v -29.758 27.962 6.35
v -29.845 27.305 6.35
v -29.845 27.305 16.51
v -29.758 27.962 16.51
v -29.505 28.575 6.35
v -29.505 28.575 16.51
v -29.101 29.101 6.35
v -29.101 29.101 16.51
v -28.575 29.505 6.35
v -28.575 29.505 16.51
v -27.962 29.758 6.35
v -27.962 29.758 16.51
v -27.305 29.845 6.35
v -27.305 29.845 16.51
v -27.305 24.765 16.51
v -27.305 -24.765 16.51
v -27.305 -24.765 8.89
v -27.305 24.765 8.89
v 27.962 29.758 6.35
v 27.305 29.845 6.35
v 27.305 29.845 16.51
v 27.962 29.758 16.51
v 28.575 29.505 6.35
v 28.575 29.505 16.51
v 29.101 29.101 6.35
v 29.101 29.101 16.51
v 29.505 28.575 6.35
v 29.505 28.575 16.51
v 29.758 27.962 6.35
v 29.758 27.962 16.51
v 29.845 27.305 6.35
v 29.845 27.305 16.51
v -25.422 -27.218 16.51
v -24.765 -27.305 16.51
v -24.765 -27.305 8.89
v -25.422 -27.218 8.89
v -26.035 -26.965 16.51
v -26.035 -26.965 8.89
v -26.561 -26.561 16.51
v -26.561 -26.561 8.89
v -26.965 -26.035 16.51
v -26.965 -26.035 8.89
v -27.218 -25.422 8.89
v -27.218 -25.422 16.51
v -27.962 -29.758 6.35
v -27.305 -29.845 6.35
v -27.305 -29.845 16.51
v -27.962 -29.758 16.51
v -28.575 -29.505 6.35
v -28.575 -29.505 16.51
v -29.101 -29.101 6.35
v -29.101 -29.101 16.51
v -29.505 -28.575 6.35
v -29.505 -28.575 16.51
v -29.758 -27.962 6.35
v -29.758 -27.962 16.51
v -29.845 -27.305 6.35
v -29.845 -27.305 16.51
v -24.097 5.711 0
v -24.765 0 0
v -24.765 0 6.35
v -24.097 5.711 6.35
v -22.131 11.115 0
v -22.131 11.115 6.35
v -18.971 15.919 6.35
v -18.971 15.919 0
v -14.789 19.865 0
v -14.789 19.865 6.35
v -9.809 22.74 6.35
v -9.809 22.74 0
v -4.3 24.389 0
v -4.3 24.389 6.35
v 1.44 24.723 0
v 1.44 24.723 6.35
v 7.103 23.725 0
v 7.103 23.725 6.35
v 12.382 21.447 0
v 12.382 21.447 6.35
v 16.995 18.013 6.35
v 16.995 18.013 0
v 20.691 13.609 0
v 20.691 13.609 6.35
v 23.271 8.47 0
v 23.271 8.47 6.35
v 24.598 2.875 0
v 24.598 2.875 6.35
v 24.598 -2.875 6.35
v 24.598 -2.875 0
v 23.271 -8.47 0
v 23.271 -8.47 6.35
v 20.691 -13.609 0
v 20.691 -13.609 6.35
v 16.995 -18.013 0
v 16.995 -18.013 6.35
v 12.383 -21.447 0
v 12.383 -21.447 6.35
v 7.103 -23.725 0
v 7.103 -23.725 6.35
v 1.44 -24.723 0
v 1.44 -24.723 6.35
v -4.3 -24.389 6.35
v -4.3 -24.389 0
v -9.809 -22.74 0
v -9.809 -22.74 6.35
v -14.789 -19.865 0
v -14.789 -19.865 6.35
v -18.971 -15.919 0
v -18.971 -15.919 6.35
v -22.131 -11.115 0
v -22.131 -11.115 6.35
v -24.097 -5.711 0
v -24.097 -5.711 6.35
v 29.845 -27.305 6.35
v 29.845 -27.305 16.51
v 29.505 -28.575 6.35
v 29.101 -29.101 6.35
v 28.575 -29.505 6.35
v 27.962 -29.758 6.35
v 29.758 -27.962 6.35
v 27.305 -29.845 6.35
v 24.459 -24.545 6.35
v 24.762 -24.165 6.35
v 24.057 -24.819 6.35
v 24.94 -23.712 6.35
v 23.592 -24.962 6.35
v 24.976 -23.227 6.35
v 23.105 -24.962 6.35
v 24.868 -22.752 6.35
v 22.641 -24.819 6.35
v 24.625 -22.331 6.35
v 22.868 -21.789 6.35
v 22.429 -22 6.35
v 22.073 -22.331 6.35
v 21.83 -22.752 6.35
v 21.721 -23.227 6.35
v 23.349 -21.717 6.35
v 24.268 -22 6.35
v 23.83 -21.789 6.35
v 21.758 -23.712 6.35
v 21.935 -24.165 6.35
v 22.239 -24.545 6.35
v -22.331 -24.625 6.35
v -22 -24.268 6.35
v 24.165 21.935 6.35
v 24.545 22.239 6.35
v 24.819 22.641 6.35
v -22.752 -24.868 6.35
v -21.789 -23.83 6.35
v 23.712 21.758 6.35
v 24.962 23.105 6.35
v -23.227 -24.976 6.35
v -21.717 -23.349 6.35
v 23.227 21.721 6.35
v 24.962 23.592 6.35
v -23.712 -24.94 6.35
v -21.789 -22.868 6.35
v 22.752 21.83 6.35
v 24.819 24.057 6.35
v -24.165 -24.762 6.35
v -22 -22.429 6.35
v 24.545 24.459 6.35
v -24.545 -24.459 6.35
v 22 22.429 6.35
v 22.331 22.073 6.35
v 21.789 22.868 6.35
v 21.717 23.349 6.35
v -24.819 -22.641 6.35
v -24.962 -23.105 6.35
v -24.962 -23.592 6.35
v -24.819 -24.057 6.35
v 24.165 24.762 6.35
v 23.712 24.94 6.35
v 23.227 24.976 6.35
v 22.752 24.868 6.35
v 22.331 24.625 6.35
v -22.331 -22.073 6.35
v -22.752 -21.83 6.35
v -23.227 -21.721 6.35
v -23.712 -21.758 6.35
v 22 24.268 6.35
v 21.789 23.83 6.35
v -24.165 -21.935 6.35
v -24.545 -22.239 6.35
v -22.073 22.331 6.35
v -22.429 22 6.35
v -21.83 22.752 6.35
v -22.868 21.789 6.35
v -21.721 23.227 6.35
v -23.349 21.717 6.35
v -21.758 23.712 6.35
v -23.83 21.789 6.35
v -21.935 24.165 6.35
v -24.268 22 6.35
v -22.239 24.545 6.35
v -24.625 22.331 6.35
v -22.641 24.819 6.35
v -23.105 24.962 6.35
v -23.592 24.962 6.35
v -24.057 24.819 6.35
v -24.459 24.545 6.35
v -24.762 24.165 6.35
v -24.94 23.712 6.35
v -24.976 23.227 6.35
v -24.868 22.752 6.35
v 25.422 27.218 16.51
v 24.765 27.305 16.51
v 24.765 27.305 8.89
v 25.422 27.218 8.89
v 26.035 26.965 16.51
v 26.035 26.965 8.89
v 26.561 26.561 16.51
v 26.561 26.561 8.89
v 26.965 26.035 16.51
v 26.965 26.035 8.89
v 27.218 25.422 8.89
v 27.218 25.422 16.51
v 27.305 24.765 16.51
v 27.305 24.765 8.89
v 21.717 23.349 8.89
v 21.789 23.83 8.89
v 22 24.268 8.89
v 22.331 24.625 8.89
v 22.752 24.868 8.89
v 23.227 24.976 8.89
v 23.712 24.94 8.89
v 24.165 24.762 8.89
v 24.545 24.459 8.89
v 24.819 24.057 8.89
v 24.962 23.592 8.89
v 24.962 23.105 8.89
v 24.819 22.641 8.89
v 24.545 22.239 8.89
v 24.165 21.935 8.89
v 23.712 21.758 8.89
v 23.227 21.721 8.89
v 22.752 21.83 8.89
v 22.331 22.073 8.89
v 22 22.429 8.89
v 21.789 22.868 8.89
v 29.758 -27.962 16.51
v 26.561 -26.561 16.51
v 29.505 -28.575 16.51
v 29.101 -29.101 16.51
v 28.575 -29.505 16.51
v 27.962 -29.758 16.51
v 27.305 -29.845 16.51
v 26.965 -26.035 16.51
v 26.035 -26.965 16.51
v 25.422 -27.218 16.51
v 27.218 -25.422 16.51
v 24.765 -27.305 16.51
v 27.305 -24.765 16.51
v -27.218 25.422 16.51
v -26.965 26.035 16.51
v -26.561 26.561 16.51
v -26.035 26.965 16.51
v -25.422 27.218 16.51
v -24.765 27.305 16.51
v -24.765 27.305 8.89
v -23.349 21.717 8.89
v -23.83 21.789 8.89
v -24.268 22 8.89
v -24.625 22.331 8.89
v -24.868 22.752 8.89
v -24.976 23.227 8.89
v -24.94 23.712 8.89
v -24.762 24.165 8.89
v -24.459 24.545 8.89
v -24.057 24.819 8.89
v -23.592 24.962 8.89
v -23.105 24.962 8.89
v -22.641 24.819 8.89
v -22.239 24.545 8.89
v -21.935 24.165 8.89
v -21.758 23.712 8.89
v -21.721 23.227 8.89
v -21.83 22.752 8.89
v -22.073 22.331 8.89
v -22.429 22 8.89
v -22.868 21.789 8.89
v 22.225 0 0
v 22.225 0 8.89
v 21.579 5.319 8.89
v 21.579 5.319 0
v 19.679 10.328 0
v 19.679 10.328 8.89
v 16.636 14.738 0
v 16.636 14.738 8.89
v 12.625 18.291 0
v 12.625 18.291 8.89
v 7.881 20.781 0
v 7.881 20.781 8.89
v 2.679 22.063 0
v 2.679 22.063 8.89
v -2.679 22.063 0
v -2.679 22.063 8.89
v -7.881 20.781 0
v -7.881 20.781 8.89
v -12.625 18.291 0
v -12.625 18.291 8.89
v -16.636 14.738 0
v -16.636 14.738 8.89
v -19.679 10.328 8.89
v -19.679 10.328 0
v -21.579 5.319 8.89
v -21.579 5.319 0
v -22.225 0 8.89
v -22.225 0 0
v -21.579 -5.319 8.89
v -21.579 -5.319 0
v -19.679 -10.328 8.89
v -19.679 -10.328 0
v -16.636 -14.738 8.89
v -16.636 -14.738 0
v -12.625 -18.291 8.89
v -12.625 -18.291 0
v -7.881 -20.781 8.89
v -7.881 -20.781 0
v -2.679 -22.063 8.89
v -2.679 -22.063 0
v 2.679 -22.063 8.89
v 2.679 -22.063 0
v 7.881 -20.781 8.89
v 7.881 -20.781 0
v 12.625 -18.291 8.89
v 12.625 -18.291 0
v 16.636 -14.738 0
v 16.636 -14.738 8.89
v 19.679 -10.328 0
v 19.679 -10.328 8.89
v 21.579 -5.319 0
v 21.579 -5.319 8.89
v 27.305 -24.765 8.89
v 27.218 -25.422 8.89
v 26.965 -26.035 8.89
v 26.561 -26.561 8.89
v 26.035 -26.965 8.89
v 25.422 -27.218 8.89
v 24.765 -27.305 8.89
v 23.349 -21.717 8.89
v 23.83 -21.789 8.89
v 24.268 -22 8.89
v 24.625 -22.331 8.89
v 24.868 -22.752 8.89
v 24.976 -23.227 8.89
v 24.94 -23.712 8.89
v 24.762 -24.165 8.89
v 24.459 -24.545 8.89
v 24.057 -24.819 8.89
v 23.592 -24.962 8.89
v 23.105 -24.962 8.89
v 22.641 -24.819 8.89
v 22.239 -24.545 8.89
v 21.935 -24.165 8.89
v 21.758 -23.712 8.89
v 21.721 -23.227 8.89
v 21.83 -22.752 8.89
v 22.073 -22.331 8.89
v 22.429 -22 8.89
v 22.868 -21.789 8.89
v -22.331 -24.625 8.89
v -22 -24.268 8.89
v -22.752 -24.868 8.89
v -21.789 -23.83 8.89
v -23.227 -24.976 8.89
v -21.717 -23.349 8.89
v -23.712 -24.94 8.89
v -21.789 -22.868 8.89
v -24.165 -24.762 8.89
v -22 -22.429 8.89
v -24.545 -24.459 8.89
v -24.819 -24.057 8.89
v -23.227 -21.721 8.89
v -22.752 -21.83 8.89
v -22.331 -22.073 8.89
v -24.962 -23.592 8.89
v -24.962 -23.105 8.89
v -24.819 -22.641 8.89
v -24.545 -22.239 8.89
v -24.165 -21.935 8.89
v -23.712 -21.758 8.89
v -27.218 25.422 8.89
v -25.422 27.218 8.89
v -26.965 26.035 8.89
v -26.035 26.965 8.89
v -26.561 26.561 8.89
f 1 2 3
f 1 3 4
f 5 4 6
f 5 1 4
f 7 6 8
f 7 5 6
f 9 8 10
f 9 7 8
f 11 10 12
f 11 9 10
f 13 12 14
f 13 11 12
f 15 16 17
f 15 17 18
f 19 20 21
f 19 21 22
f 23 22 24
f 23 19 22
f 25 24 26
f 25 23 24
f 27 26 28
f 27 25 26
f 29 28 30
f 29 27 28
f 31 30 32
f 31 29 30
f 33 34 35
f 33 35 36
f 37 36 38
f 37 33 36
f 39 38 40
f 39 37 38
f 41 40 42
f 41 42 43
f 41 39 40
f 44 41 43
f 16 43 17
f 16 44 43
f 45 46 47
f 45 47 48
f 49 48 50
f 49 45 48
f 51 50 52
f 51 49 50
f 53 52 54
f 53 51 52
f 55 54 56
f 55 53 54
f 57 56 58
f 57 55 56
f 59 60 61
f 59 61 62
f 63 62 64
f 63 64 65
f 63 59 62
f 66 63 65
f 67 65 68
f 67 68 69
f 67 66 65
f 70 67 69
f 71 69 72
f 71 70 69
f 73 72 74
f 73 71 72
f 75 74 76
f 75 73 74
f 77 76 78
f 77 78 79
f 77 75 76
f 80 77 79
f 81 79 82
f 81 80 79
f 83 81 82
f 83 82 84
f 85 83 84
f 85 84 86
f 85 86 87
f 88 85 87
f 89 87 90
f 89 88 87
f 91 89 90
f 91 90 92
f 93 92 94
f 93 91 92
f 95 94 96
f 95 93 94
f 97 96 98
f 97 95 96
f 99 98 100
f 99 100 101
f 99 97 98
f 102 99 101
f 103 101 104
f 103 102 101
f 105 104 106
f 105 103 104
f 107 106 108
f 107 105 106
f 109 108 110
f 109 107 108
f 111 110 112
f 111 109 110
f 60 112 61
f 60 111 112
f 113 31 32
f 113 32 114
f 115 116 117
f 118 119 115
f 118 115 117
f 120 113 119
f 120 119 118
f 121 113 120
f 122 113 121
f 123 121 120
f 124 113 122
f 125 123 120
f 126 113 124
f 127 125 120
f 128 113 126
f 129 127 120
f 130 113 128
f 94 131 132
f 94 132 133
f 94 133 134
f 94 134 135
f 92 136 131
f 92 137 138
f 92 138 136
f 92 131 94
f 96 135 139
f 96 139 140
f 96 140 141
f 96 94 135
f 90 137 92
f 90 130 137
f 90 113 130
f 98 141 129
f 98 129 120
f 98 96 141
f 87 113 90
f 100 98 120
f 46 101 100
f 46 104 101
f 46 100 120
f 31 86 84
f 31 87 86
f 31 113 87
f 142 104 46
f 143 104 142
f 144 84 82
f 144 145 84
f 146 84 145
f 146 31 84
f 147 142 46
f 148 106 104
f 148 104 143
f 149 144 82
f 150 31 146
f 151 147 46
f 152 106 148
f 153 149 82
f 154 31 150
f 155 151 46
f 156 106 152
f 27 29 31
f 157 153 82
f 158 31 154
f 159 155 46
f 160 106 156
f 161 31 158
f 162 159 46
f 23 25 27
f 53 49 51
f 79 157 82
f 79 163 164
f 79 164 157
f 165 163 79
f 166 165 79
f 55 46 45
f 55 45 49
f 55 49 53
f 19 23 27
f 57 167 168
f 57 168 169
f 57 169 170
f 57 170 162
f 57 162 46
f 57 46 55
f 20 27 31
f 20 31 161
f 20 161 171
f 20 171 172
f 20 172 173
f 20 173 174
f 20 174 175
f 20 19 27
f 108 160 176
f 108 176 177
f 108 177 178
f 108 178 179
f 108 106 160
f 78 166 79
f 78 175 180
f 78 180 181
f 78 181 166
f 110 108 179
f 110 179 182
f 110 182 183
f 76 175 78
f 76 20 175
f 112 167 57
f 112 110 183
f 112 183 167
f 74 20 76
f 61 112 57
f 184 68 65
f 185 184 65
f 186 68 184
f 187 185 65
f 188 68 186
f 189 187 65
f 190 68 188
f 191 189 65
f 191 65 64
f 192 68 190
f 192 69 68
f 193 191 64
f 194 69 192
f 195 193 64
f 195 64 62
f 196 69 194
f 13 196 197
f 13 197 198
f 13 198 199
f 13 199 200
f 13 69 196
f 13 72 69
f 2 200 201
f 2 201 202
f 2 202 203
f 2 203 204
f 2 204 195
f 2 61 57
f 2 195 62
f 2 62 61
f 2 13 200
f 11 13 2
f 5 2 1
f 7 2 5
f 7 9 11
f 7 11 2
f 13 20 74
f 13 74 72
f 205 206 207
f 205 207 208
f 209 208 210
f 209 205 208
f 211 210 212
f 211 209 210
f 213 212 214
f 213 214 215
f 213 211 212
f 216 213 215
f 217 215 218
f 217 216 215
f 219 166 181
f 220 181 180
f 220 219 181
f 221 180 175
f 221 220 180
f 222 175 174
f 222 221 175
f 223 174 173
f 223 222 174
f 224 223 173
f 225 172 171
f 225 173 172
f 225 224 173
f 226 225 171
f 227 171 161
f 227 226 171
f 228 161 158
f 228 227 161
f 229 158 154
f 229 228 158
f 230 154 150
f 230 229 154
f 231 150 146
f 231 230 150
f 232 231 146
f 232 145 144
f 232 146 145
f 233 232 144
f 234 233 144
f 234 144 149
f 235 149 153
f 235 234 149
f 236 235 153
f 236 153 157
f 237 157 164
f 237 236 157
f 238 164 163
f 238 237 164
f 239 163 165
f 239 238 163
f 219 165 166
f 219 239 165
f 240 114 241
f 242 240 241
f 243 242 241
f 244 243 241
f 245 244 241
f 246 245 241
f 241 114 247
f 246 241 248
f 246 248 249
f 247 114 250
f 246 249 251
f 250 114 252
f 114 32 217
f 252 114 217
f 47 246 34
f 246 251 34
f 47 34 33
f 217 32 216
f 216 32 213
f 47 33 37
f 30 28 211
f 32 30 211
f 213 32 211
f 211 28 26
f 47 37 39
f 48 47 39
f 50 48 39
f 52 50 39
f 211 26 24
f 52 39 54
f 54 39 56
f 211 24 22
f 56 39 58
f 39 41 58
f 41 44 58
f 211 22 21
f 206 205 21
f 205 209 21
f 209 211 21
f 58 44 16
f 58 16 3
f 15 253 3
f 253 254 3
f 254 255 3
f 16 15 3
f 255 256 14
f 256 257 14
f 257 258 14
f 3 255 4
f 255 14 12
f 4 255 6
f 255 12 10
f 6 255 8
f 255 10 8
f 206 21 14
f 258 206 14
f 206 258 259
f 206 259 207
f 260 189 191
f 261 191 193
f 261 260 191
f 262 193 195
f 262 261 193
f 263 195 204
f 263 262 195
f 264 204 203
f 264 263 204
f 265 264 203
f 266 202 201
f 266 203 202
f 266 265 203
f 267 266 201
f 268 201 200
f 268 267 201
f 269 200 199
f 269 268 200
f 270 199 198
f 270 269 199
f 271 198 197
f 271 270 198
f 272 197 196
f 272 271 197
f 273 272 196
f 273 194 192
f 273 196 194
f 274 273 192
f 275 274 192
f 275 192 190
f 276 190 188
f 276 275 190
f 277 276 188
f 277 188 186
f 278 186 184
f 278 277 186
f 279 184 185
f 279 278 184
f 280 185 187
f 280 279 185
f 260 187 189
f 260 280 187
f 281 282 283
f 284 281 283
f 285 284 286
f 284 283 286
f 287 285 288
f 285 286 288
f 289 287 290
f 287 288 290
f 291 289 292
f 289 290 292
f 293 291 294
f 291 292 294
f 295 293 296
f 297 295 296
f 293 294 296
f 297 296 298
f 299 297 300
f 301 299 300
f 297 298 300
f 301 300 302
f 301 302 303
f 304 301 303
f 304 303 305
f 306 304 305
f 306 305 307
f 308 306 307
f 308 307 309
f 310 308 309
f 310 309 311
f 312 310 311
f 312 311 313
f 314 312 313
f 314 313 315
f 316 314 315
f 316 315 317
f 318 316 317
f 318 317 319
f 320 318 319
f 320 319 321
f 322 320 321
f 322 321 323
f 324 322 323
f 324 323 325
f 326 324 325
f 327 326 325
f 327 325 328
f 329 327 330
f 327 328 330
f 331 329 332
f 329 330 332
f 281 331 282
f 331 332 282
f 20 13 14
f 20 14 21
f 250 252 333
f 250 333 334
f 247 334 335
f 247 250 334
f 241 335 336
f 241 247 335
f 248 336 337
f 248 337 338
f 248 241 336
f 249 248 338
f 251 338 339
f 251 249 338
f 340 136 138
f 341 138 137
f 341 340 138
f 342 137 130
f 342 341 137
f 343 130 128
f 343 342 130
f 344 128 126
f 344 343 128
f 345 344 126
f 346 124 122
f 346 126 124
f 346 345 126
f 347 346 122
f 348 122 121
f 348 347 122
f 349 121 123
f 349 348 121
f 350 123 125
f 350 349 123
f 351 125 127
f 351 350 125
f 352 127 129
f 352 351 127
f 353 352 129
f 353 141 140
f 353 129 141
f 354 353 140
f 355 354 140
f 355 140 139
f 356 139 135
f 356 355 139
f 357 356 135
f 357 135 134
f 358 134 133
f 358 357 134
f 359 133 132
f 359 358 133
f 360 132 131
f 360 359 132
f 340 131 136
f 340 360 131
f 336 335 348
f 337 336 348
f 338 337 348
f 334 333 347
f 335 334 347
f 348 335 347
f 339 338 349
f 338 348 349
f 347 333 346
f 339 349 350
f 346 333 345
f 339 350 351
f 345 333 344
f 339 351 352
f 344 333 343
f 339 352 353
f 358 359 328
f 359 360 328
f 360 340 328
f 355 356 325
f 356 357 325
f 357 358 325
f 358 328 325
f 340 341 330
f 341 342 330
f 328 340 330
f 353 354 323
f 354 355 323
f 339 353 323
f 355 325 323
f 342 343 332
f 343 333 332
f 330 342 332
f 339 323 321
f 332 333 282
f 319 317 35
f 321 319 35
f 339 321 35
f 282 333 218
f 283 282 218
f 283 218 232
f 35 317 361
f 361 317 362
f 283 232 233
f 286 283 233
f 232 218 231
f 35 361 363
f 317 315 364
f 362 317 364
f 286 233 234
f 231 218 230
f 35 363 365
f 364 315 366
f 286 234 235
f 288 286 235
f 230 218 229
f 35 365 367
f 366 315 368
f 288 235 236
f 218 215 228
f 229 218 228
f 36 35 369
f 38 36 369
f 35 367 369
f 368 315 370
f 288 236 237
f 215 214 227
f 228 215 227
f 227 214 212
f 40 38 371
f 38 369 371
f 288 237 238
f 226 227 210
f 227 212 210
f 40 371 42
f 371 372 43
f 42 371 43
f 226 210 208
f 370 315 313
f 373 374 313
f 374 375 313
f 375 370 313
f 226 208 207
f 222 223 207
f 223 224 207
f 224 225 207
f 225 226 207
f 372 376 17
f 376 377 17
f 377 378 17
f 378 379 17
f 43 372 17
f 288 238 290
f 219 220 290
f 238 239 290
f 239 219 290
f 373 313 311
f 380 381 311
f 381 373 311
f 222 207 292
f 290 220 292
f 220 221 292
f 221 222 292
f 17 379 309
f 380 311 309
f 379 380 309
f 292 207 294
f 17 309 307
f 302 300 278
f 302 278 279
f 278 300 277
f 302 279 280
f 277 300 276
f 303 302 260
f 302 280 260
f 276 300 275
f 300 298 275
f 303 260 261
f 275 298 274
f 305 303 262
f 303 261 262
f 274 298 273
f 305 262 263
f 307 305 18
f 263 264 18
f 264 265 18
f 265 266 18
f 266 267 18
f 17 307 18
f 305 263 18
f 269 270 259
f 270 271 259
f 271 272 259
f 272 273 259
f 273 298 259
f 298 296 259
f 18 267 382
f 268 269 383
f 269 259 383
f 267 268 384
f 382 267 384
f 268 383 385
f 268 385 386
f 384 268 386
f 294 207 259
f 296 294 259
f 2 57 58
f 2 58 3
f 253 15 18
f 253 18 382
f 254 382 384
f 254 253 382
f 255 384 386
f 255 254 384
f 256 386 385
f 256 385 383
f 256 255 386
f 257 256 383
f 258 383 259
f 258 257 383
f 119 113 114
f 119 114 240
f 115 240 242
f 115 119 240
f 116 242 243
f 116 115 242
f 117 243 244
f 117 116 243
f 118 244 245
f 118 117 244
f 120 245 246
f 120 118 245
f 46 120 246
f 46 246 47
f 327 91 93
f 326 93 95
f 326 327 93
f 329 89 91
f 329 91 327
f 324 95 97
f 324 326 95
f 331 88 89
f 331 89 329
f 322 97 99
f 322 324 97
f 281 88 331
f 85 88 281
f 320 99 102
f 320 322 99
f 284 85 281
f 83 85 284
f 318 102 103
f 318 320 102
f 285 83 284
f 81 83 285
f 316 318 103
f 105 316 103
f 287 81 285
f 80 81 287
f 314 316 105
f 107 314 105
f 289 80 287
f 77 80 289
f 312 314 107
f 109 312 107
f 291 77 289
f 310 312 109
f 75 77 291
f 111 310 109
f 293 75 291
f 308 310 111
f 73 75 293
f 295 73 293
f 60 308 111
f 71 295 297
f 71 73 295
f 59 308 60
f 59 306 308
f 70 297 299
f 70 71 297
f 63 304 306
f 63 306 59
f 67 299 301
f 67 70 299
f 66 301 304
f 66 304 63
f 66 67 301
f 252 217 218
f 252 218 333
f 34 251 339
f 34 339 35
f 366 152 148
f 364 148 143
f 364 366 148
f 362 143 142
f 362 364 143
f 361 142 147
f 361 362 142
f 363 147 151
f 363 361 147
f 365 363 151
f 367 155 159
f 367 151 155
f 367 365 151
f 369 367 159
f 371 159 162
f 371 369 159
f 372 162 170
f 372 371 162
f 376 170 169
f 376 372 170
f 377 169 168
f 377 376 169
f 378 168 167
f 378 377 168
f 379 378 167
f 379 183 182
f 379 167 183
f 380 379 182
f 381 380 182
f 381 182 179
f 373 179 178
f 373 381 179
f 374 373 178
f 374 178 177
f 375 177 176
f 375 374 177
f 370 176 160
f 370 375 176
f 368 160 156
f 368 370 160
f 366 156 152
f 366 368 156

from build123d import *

# Parameters (mm, degrees)
BOSS_EXTRUDE1_DEPTH = 16.51
SKETCH2_R           = 22.225
CUT_EXTRUDE1_DEPTH  = 17.51
SKETCH4_OUTSIDE_W   = 78.892
SKETCH4_OUTSIDE_H   = 78.892
SKETCH4_OUTSIDE_R   = 24.765
CUT_EXTRUDE2_DEPTH  = 6.35
CUT_EXTRUDE3_DEPTH  = 7.62
CIRPATTERN1_COUNT   = 4


with BuildPart() as part:
    # Sketch1 → Boss-Extrude1 (new body)
    with BuildSketch(Plane.XY):
        with BuildLine():
            Line((-27.305, 29.845), (27.305, 29.845))
            ThreePointArc((27.305, 29.845), (29.101051224, 29.101051224), (29.845, 27.305))
            Line((29.845, 27.305), (29.845, -27.305))
            ThreePointArc((29.845, -27.305), (29.101051224, -29.101051224), (27.305, -29.845))
            Line((27.305, -29.845), (-27.305, -29.845))
            ThreePointArc((-27.305, -29.845), (-29.101051224, -29.101051224), (-29.845, -27.305))
            Line((-29.845, -27.305), (-29.845, 27.305))
            ThreePointArc((-29.845, 27.305), (-29.101051224, 29.101051224), (-27.305, 29.845))
        make_face()
    extrude(amount=BOSS_EXTRUDE1_DEPTH)

    # Sketch2 → Cut-Extrude1 (cut, through all)
    with BuildSketch(Plane.XY.offset(16.51)):
        Circle(SKETCH2_R)
    extrude(amount=-CUT_EXTRUDE1_DEPTH, mode=Mode.SUBTRACT)

    # Sketch4 outside → Cut-Extrude2 (cut)
    with BuildSketch(Plane(origin=(0, 0, 0), x_dir=(-1, 0, 0), z_dir=(0, 0, -1))):
        Rectangle(SKETCH4_OUTSIDE_W, SKETCH4_OUTSIDE_H)
        Circle(SKETCH4_OUTSIDE_R, mode=Mode.SUBTRACT)
    extrude(amount=-CUT_EXTRUDE2_DEPTH, mode=Mode.SUBTRACT)

    # Sketch3 → Cut-Extrude3 (cut)
    with BuildSketch(Plane.XY.offset(16.51)):
        with BuildLine():
            Line((24.765, -27.305), (-24.765, -27.305))
            ThreePointArc((-24.765, -27.305), (-26.561051224, -26.561051224), (-27.305, -24.765))
            Line((-27.305, -24.765), (-27.305, 24.765))
            ThreePointArc((-27.305, 24.765), (-26.561051224, 26.561051224), (-24.765, 27.305))
            Line((-24.765, 27.305), (24.765, 27.305))
            ThreePointArc((24.765, 27.305), (26.561051224, 26.561051224), (27.305, 24.765))
            Line((27.305, 24.765), (27.305, -24.765))
            ThreePointArc((27.305, -24.765), (26.561051224, -26.561051224), (24.765, -27.305))
        make_face()
    extrude(amount=-CUT_EXTRUDE3_DEPTH, mode=Mode.SUBTRACT)

    # Sketch6 → #4 Clearance Hole1 (revolve, cut)
    with BuildSketch(Plane(origin=(-23.348665915, 23.348665915, 8.89), x_dir=(0, -1, 0), z_dir=(1, 0, 0))):
        Polygon((0, 0), (0, 8.575174487), (1.63195, 7.5946), (1.63195, 0), align=None)
    f_4_clearance_hole1 = revolve(axis=Axis((-23.348665915, 23.348665915, 15.24), (0, 0, -1)), mode=Mode.SUBTRACT)

    # CirPattern1: #4 Clearance Hole1 ×4 about axis
    cirpattern1_axis = Axis((0, 0, 0), (0, 0, 1))
    for i in range(1, CIRPATTERN1_COUNT):
        add(f_4_clearance_hole1.rotate(cirpattern1_axis, i * 360 / CIRPATTERN1_COUNT), mode=Mode.SUBTRACT)


solid = part.part
